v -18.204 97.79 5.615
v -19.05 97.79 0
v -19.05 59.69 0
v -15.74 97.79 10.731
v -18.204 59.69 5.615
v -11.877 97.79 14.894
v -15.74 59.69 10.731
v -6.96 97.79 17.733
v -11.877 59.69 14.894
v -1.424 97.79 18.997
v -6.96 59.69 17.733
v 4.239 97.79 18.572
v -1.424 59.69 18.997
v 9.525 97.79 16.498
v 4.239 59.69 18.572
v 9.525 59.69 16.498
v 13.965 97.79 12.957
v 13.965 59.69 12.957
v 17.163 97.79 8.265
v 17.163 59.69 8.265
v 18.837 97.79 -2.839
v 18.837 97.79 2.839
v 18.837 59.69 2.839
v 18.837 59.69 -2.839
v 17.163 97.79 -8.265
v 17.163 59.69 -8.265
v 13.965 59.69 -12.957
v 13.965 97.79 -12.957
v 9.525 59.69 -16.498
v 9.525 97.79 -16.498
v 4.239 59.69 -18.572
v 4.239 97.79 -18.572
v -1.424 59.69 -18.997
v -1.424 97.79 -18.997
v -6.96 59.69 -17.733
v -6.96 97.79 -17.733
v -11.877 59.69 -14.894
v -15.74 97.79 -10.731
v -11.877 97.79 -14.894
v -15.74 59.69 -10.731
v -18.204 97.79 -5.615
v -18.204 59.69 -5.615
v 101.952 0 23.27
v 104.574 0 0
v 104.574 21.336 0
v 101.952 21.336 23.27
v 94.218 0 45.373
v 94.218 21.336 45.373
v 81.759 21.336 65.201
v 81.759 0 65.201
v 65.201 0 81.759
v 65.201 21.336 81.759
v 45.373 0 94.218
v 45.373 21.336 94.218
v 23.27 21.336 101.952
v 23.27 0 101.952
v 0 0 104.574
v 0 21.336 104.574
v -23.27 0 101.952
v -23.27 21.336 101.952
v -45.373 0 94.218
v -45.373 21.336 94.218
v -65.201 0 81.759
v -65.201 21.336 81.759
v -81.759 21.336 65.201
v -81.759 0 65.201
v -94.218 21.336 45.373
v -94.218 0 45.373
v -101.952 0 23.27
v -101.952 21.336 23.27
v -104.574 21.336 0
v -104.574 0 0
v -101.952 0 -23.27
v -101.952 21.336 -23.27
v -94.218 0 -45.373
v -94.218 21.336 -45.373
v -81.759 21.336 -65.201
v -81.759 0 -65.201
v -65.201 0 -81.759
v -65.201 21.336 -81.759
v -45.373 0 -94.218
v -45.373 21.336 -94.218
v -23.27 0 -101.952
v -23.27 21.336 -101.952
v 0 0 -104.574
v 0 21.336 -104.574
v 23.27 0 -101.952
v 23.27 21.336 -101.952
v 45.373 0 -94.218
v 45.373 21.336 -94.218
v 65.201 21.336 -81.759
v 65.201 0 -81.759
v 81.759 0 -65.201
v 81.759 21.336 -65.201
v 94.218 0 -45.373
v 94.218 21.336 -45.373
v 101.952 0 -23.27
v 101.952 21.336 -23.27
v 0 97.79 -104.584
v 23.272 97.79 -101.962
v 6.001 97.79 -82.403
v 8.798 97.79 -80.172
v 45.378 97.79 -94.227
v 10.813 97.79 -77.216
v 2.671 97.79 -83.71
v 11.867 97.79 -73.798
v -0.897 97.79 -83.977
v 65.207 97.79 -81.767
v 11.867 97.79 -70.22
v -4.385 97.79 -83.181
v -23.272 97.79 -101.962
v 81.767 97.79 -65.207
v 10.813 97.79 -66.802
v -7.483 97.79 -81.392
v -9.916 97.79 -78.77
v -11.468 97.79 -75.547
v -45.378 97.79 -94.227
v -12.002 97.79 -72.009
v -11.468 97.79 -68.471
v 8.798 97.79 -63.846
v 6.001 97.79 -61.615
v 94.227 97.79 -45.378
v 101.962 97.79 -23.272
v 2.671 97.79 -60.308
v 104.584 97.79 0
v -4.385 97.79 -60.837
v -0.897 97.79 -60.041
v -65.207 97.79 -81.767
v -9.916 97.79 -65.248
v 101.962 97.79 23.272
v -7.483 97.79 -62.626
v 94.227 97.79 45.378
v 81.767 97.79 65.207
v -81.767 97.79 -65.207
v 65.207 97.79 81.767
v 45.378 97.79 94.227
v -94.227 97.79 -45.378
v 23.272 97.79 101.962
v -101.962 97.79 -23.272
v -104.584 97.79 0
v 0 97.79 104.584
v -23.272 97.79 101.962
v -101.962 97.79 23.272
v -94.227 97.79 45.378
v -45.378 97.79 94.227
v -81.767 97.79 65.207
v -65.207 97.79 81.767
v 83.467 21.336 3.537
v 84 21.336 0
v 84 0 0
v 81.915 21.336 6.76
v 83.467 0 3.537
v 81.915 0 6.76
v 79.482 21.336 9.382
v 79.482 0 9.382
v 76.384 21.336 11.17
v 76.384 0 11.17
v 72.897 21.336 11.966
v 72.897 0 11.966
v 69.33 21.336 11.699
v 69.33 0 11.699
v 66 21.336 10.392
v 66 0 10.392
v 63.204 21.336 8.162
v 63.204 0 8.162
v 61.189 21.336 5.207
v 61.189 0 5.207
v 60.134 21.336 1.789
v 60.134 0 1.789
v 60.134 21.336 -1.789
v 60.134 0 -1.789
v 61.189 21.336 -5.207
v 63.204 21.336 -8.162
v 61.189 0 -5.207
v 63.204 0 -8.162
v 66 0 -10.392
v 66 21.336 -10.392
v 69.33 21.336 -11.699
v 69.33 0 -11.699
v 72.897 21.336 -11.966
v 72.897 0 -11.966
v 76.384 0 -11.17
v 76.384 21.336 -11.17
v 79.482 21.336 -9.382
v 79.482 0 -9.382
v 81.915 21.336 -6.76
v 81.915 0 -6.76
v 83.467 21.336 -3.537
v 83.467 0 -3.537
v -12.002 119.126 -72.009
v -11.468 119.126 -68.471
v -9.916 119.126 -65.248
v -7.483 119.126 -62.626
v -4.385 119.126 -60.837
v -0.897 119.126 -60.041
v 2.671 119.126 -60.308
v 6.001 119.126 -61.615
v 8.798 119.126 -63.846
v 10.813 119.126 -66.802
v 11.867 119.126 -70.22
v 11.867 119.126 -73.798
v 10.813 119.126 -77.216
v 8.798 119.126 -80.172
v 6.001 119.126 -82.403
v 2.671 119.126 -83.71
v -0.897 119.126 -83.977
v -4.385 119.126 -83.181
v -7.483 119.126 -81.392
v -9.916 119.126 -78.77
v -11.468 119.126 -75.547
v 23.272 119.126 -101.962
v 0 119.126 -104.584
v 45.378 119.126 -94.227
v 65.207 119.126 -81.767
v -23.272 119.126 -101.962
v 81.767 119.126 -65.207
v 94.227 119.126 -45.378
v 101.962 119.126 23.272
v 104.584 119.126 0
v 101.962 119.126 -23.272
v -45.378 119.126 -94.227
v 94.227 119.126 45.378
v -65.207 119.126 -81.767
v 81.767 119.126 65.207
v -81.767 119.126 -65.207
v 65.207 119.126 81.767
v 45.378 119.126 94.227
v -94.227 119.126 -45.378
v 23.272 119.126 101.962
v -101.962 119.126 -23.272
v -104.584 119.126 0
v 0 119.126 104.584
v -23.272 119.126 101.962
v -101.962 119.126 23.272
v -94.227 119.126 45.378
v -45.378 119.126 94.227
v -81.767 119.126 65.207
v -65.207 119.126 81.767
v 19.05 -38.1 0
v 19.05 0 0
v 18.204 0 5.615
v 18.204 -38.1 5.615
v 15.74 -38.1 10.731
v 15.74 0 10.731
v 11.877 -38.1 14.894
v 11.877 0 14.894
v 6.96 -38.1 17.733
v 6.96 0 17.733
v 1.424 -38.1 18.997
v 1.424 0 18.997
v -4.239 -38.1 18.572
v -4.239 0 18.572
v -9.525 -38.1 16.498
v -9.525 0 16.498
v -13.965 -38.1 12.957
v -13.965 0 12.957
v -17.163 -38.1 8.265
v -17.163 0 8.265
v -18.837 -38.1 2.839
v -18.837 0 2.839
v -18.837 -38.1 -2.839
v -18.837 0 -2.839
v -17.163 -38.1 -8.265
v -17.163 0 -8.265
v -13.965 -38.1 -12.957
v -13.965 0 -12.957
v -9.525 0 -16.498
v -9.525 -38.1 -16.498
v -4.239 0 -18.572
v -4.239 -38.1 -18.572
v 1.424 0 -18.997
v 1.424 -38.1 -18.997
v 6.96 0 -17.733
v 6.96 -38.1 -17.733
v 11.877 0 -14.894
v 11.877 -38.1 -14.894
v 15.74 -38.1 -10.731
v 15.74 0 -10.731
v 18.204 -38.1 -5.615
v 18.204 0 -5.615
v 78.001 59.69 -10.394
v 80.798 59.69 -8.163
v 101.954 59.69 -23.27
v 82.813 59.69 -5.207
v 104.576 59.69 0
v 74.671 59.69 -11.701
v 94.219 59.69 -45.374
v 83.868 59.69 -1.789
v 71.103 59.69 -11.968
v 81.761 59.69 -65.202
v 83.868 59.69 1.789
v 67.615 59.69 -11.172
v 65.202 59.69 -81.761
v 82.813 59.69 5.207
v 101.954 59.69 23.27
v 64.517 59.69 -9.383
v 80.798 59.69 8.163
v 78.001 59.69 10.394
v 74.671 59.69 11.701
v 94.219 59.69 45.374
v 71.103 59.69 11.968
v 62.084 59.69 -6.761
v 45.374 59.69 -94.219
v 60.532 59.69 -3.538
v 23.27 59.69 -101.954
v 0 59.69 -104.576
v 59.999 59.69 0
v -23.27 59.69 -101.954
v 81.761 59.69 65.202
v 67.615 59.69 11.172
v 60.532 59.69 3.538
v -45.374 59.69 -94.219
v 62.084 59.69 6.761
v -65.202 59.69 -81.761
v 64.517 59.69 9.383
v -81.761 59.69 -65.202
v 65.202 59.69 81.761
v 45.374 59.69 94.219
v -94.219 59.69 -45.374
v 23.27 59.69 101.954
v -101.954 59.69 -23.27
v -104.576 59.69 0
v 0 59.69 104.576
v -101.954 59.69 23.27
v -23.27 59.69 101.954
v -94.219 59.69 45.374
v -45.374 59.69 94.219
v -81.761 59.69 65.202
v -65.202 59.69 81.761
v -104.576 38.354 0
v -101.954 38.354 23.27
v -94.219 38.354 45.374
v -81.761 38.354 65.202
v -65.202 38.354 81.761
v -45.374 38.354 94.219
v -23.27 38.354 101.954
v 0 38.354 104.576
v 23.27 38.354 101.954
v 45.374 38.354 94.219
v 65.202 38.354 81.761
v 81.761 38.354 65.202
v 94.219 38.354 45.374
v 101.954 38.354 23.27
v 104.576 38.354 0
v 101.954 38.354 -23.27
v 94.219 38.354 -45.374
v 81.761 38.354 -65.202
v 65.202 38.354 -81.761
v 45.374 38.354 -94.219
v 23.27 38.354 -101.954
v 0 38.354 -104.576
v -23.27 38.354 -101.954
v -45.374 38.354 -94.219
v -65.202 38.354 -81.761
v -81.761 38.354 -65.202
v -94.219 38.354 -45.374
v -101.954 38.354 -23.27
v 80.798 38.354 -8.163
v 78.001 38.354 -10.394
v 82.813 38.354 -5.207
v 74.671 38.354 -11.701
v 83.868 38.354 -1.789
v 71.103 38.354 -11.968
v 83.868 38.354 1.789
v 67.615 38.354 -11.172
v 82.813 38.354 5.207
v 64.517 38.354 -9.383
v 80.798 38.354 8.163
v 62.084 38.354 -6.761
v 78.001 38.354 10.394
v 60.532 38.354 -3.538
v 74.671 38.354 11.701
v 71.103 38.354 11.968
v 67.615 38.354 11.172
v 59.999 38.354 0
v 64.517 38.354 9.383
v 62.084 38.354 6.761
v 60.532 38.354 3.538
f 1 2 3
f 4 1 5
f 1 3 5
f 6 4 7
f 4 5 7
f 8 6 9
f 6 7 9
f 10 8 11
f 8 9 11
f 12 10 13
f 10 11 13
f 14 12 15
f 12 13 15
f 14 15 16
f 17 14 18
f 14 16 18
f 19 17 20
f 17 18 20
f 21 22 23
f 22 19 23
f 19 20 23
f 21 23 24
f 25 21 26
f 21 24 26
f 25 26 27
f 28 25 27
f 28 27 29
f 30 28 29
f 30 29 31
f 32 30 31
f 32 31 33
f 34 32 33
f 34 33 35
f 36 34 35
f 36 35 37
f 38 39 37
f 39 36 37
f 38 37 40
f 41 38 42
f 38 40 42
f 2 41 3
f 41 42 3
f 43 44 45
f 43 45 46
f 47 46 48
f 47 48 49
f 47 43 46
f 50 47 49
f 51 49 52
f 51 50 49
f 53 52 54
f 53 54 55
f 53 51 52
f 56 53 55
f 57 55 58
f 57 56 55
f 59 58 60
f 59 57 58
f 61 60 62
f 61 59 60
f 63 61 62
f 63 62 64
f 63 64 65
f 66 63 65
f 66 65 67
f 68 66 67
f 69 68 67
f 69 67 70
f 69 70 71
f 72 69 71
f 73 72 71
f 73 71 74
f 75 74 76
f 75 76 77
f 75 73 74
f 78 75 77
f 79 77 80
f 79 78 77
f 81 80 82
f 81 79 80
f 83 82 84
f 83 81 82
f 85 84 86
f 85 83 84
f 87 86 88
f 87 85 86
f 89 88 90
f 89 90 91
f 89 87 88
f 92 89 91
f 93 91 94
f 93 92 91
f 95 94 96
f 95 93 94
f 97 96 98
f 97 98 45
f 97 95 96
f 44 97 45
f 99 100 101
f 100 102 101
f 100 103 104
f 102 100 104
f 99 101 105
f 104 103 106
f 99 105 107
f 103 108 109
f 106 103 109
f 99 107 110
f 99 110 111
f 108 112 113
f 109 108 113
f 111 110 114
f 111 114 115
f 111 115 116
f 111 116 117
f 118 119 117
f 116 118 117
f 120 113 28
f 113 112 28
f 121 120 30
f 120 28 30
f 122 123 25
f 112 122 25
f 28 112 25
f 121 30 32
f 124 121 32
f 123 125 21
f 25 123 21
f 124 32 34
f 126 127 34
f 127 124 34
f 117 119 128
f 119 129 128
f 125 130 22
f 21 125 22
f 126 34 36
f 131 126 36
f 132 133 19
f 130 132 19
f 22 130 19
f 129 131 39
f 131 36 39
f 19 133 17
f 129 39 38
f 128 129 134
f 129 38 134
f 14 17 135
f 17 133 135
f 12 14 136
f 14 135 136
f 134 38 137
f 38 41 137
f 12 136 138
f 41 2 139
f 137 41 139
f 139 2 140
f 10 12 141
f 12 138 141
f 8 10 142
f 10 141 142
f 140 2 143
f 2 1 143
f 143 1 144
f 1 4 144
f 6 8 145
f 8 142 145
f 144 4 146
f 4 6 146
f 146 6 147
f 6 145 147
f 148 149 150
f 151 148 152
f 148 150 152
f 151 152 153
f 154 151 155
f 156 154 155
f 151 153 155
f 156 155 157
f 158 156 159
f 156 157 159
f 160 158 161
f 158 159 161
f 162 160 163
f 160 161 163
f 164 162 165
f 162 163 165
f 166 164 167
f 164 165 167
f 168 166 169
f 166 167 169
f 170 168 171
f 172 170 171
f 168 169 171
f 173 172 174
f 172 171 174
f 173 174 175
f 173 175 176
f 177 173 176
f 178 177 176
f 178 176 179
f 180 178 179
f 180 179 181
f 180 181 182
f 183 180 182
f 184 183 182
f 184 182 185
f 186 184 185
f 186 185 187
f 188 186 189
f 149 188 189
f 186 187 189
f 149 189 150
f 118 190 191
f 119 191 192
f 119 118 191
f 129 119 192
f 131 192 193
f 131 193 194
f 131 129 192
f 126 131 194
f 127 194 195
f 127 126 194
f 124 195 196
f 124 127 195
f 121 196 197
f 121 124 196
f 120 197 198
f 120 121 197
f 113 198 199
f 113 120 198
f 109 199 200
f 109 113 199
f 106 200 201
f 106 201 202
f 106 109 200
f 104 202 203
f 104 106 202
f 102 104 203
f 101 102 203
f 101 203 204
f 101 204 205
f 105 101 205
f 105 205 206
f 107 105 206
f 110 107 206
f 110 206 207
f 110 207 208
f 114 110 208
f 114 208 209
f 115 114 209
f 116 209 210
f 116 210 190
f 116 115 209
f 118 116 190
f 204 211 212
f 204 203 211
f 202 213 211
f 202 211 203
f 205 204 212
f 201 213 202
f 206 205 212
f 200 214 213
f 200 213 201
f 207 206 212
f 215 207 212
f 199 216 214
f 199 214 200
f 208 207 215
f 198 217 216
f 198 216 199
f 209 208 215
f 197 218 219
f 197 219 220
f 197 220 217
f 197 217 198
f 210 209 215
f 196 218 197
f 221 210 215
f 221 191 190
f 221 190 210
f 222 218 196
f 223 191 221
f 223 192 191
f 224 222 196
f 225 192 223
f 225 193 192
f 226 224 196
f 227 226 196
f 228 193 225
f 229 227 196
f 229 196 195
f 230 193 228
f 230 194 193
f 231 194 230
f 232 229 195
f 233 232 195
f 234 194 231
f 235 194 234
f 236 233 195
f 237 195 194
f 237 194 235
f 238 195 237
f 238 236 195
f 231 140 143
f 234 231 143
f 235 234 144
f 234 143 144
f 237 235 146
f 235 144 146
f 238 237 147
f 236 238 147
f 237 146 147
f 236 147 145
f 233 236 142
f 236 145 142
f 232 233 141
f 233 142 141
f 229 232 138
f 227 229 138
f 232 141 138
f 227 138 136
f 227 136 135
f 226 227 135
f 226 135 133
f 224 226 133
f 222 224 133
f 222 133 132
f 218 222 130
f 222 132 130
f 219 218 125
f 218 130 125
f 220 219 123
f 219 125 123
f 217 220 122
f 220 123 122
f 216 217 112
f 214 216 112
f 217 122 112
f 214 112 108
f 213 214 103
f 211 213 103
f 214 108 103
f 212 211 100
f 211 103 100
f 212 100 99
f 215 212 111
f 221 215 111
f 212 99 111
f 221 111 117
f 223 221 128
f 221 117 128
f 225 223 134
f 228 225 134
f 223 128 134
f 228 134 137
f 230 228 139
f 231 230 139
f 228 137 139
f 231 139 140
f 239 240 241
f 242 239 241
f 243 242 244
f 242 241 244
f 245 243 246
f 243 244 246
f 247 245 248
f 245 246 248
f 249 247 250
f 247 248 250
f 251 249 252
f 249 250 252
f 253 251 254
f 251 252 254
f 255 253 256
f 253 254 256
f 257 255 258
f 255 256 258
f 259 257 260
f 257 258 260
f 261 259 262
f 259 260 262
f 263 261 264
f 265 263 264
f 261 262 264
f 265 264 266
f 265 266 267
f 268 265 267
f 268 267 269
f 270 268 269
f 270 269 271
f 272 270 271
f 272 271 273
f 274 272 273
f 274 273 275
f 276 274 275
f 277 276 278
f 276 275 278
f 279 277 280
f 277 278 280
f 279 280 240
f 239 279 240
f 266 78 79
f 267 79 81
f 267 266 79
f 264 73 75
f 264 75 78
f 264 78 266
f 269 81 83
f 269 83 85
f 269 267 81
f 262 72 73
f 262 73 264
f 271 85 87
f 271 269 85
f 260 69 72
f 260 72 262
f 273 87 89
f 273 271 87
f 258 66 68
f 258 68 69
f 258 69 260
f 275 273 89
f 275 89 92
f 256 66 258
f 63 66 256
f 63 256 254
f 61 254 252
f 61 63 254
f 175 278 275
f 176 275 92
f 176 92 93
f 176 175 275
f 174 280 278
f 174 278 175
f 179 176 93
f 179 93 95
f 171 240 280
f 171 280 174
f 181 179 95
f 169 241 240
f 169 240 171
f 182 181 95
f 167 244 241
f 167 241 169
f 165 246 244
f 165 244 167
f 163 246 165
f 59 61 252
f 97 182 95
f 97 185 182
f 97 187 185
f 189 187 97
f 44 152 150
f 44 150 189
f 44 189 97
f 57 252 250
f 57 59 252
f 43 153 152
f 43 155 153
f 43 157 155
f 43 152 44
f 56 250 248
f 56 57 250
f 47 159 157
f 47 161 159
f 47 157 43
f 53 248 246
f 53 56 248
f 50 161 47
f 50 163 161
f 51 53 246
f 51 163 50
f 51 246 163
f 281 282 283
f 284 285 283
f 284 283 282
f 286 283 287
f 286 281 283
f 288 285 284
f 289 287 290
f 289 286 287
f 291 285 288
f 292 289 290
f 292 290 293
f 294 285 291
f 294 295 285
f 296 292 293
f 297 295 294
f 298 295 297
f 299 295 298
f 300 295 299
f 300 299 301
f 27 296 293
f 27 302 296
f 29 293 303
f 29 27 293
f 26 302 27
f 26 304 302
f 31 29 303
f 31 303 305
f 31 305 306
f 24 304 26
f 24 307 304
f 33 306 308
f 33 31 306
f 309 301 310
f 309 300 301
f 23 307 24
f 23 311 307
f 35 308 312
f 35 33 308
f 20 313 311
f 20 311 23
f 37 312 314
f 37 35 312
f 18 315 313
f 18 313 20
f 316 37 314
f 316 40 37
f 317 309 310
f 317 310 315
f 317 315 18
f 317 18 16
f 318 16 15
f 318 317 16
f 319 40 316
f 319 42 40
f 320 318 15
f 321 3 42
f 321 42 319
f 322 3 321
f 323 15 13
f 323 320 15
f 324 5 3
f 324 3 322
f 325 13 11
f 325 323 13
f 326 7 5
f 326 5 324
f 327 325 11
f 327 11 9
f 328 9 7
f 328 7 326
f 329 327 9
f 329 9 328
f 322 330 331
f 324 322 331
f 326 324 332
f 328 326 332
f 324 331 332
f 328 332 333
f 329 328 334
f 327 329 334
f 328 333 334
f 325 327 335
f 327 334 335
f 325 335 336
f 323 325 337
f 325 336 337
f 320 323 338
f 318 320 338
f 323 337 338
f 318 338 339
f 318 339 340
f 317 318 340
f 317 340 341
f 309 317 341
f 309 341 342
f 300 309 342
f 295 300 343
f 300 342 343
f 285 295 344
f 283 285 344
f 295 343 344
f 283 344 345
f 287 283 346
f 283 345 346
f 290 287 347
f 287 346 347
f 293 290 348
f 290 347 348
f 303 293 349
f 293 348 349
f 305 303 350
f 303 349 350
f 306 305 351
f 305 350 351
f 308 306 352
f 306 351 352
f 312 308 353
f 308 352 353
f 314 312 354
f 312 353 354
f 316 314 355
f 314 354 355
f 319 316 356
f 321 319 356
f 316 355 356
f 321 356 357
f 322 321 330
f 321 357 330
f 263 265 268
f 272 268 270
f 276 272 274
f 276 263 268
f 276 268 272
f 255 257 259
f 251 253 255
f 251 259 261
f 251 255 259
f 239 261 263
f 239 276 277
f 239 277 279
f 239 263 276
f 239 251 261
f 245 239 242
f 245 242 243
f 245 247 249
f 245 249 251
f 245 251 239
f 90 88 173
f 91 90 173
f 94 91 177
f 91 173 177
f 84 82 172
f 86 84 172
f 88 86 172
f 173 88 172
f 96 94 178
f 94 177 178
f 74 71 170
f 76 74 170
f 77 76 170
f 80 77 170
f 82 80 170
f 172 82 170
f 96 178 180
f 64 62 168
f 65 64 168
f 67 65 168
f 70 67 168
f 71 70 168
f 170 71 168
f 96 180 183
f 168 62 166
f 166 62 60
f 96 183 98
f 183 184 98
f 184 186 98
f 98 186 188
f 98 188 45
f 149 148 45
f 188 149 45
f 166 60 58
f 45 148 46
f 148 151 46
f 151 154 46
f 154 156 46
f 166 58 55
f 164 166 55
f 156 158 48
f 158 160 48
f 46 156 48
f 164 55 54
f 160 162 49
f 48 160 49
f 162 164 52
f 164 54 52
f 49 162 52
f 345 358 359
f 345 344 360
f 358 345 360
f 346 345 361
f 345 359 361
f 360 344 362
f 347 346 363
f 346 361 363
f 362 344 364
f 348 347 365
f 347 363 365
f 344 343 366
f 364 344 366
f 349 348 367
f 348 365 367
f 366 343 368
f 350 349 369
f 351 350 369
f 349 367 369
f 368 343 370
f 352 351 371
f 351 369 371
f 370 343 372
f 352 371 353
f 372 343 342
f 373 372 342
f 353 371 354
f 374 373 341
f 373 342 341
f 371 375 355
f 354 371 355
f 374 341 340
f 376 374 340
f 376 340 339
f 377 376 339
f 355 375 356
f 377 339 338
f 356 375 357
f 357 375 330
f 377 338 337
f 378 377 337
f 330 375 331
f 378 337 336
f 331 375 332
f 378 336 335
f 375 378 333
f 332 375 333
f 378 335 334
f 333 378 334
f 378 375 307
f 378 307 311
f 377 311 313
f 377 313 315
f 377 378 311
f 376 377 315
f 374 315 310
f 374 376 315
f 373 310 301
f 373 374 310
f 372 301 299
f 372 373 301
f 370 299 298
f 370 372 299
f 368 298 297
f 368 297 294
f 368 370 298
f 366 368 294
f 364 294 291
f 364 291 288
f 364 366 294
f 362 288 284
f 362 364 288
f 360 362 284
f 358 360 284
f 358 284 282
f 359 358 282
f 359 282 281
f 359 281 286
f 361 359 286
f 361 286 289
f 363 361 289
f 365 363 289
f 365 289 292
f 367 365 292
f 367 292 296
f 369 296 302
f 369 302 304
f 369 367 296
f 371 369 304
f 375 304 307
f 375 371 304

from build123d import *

# Parameters (mm, degrees)
F0_R      = 104.574086
F0_R_2    = 11.999976
F1_DEPTH  = 21.336
F2_R      = 19.05
F3_DEPTH  = 38.1
F5_R      = 104.57561
F5_R_2    = 12.0015
F5_R_3    = 19.05
F6_DEPTH  = 21.336
F7_DEPTH  = 80.772
F9_R      = 104.5845
F9_R_2    = 12.0015
F10_DEPTH = 21.336


with BuildPart() as f1:
    # F0 (on Front) → F1 (new body)
    with BuildSketch(Plane.XZ):
        Circle(F0_R)
        with Locations((72.00011, 0)):
            Circle(F0_R_2, mode=Mode.SUBTRACT)
    extrude(amount=-F1_DEPTH)

    # F2 (on face) → F3 (join)
    with BuildSketch(Plane.XZ):
        Circle(F2_R)
    extrude(amount=F3_DEPTH)


with BuildPart() as f6:
    # F5 (on offset) → F6 (new body)
    with BuildSketch(Plane(origin=(0, 38.354, 0), x_dir=(-1, 0, 0), z_dir=(0, 1, 0))):
        Circle(F5_R)
        with Locations((-72.00011, 0)):
            Circle(F5_R_2, mode=Mode.SUBTRACT)
        Circle(F5_R_3, mode=Mode.SUBTRACT)
    extrude(amount=F6_DEPTH)

    # F5 (on offset) → F7 (join)
    with BuildSketch(Plane(origin=(0, 38.354, 0), x_dir=(-1, 0, 0), z_dir=(0, 1, 0))):
        Circle(F5_R_3)
    extrude(amount=F7_DEPTH)

    # F9 (on offset) → F10 (join)
    with BuildSketch(Plane(origin=(0, 97.79, 0), x_dir=(-1, 0, 0), z_dir=(0, 1, 0))):
        Circle(F9_R)
        with Locations((0, -72.009)):
            Circle(F9_R_2, mode=Mode.SUBTRACT)
    extrude(amount=F10_DEPTH)


solid = Compound([f1.part, f6.part])
